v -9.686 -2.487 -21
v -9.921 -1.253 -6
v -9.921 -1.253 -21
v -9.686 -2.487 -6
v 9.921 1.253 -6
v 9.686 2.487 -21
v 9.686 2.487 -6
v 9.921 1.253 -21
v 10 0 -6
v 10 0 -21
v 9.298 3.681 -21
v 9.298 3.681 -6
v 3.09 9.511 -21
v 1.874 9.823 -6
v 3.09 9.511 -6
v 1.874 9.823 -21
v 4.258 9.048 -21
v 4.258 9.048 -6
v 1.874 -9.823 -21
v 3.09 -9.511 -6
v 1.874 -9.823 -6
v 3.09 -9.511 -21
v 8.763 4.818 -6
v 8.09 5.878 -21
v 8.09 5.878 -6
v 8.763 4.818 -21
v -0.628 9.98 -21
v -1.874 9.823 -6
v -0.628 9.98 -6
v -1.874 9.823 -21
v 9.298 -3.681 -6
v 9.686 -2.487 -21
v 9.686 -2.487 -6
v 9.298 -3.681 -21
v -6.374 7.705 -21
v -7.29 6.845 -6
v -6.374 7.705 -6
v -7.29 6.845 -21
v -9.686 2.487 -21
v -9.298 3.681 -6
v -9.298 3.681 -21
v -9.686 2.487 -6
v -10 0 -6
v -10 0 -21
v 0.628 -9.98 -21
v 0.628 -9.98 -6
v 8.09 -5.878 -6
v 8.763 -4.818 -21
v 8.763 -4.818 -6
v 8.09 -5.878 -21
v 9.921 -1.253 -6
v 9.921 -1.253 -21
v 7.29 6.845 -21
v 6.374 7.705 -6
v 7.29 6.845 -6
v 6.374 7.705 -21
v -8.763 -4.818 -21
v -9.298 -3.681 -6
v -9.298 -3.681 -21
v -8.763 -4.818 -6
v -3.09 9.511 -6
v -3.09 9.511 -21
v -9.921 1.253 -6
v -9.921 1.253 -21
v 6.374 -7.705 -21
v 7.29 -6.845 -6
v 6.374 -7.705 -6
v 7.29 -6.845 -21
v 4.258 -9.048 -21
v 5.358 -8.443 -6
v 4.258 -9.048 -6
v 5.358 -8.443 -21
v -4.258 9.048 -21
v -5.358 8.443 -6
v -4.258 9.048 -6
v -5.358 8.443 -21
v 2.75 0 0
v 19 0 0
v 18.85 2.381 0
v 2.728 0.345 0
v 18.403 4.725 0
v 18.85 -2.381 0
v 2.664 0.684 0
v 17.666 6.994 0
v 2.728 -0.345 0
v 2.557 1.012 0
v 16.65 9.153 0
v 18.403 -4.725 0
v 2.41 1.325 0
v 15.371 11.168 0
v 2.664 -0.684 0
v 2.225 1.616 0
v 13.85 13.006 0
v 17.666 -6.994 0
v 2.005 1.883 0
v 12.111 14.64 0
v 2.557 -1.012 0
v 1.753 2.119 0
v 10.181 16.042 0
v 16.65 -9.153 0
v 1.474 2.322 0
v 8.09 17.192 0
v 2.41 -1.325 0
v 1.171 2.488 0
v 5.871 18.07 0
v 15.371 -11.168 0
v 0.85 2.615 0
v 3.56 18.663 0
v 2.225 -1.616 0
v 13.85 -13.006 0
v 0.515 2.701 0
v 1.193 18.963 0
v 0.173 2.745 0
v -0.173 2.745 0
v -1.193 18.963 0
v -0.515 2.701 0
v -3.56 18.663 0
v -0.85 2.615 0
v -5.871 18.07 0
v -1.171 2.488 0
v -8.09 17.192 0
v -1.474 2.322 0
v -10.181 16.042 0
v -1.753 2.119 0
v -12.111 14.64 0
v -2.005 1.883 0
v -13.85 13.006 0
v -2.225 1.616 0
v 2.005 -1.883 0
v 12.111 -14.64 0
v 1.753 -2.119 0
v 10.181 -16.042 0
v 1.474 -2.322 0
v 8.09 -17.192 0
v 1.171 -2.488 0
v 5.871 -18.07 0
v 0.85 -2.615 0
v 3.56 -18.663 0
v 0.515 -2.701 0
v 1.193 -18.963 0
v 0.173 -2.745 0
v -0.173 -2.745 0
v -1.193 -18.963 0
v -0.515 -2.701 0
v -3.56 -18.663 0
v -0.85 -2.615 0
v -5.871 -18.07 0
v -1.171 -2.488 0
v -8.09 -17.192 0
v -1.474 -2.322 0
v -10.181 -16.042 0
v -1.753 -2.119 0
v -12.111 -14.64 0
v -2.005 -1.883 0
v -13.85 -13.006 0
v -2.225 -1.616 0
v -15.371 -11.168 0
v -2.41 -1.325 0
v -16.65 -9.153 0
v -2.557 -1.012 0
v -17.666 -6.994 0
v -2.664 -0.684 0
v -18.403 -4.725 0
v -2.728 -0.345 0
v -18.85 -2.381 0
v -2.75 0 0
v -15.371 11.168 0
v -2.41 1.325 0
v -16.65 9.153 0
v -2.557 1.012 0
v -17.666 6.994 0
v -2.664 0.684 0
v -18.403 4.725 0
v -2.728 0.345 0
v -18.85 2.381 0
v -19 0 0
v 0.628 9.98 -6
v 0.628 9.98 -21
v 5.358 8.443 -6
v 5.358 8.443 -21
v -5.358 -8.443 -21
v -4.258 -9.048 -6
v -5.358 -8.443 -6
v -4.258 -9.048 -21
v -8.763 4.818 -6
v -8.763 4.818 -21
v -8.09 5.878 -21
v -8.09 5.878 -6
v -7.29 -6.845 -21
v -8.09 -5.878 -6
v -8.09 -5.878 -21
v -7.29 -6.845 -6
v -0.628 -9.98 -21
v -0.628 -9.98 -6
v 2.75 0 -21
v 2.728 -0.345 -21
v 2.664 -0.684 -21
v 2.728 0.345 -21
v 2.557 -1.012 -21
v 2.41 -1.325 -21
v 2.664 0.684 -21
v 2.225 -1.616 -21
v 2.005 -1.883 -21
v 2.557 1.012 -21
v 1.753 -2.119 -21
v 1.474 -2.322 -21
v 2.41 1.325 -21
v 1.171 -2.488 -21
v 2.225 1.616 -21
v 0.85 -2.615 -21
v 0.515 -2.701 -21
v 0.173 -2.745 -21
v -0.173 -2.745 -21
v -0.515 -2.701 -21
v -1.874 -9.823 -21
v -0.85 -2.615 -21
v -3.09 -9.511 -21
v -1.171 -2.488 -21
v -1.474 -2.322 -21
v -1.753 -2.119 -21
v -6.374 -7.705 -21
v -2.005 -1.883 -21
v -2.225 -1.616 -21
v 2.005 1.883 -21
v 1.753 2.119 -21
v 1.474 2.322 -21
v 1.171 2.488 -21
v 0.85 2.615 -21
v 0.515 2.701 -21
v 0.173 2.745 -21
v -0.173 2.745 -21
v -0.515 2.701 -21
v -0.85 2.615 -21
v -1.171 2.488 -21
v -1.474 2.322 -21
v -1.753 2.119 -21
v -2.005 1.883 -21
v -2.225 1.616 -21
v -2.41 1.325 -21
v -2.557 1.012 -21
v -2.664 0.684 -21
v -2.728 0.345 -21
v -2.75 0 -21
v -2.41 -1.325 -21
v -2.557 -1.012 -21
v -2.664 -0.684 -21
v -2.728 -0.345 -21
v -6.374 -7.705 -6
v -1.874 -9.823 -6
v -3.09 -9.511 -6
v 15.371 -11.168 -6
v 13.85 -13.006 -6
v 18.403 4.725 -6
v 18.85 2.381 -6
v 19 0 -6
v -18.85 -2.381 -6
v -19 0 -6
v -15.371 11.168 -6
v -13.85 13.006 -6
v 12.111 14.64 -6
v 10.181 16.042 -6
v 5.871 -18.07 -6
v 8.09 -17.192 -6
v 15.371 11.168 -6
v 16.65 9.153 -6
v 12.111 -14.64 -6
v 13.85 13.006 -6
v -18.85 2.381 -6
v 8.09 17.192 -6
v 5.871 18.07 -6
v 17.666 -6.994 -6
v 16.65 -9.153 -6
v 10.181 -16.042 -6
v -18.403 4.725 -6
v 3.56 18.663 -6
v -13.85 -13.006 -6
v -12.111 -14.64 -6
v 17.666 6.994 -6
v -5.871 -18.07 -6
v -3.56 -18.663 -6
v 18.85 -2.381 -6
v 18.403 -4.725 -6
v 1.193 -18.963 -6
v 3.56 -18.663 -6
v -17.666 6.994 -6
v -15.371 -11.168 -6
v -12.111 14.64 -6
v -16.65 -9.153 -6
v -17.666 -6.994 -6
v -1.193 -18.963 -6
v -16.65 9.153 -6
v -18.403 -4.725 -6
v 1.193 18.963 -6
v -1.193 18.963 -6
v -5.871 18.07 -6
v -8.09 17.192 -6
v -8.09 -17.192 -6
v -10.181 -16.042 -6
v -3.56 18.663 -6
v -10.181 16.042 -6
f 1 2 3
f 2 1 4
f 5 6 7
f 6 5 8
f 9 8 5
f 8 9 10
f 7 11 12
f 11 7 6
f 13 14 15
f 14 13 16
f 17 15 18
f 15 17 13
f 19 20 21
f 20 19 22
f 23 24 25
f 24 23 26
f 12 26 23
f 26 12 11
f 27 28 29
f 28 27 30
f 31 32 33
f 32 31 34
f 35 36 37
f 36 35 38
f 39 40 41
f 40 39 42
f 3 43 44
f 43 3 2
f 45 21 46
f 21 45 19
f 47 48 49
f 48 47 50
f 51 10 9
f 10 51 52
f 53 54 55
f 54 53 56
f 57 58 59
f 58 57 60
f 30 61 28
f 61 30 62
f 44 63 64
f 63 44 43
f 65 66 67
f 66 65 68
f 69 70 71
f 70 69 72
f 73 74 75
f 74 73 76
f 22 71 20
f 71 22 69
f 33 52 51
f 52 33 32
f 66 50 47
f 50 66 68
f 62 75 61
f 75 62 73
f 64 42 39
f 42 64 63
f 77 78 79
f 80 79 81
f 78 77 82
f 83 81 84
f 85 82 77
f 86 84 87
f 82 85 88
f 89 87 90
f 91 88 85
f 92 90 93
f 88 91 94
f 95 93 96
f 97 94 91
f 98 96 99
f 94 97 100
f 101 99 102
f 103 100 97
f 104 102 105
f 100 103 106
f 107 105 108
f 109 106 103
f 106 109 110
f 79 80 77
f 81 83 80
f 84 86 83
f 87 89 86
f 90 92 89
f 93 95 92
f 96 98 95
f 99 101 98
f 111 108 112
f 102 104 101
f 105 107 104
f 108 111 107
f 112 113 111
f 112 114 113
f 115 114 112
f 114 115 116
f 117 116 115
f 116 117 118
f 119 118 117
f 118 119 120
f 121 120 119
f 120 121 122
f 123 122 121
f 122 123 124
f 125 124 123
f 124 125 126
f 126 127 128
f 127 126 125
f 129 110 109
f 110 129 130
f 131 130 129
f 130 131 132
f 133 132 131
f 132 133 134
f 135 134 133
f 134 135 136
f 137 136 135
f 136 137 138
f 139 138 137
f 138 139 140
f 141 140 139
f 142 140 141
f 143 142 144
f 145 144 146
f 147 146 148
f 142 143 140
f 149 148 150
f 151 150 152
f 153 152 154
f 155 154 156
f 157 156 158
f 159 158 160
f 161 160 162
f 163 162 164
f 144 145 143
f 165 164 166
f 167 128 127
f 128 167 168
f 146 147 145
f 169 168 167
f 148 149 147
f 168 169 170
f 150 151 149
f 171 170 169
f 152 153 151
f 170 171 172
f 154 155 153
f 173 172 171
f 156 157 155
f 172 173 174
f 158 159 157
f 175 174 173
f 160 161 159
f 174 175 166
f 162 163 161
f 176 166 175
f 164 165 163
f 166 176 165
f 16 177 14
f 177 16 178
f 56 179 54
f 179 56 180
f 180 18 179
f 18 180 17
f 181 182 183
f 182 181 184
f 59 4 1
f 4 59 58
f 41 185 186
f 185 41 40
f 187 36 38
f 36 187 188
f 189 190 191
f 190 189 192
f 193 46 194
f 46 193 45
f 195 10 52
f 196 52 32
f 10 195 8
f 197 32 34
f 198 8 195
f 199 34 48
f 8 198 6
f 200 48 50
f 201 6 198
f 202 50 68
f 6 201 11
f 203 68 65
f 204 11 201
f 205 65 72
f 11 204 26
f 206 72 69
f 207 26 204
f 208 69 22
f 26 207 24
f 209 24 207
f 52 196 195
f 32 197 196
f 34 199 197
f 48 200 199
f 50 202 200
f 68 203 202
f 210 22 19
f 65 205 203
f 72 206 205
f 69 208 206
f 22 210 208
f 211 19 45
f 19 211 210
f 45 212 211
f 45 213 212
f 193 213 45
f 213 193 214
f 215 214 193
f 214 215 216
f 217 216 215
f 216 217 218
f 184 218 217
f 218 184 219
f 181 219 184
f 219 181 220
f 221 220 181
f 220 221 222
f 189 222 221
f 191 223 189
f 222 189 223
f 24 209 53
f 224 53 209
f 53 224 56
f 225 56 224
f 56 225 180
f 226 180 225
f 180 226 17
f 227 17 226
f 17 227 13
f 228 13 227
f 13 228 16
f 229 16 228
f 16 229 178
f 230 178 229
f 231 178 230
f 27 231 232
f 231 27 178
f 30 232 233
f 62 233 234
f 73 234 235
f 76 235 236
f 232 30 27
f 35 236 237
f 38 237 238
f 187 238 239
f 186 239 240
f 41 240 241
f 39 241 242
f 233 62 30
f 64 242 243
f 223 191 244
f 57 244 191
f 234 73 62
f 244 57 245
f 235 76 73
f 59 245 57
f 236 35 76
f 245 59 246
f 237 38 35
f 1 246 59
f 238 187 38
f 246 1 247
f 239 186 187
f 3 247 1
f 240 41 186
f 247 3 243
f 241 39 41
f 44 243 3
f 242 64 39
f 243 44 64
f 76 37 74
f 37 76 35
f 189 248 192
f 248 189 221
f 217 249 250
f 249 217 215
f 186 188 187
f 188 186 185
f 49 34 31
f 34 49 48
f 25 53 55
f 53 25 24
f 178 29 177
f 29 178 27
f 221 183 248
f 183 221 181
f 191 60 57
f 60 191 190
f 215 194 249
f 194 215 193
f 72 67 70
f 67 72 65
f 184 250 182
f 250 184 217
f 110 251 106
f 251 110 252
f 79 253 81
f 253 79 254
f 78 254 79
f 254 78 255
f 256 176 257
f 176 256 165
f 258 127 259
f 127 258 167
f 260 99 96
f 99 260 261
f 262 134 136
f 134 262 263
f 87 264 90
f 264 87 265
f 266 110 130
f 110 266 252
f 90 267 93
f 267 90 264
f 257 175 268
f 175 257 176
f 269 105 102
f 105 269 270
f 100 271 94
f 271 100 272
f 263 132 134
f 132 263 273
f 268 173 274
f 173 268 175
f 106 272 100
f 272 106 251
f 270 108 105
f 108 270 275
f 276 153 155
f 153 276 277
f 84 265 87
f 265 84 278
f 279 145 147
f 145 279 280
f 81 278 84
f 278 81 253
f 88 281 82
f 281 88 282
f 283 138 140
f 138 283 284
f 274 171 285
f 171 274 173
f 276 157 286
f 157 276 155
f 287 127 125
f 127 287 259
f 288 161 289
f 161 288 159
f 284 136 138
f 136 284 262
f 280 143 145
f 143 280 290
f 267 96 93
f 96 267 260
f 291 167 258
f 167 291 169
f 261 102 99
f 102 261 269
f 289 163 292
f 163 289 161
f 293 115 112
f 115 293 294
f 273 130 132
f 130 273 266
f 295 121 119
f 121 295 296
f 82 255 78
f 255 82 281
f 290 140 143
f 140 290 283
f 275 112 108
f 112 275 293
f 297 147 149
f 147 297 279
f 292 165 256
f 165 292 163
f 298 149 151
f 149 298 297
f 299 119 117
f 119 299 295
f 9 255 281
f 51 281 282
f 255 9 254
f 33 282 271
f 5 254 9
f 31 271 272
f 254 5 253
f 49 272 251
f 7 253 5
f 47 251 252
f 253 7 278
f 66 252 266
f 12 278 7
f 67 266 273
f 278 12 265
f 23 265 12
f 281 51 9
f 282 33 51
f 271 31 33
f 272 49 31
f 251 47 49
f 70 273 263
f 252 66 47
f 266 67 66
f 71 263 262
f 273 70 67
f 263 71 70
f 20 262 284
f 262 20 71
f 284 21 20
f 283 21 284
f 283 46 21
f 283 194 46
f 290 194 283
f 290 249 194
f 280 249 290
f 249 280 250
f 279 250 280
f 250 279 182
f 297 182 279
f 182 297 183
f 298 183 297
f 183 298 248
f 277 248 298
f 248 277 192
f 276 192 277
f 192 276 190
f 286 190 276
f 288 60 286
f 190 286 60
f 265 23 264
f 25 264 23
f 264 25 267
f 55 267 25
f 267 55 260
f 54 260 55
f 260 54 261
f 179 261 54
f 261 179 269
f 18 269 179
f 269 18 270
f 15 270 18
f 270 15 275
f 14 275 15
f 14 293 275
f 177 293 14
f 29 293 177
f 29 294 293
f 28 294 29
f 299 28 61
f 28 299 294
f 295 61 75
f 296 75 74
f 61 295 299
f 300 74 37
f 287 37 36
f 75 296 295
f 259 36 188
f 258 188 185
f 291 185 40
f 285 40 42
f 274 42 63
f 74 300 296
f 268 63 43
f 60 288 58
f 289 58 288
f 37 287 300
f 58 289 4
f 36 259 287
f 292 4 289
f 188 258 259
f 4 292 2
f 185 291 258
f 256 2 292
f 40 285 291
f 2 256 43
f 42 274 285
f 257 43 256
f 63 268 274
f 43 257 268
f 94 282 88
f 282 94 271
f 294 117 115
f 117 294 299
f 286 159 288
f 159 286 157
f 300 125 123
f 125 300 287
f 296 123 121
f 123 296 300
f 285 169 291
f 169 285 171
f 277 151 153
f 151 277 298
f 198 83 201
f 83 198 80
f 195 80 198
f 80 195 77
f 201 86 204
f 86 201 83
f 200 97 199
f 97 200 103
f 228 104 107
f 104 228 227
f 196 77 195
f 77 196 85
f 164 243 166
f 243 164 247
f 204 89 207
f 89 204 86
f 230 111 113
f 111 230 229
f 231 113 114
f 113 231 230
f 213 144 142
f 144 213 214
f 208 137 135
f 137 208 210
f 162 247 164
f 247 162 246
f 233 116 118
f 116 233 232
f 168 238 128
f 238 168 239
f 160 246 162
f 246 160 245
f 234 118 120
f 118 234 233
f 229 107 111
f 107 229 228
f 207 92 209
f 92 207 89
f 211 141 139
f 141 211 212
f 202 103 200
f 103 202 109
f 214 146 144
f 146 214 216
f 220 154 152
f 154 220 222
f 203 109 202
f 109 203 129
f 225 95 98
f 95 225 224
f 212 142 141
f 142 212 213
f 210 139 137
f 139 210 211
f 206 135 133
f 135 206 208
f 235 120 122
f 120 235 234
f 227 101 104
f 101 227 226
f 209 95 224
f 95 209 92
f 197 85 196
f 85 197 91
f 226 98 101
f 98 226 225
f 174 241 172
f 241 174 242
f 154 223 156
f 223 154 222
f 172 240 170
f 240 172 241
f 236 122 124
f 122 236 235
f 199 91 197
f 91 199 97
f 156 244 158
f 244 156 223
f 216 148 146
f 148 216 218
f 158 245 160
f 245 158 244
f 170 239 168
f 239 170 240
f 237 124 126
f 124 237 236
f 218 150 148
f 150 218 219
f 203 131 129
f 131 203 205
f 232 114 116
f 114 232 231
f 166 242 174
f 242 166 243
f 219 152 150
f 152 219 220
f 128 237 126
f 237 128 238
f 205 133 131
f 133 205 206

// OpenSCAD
$fn = 50;


difference() {
	union() {
		translate(v = [0, 0, -21.0000000000]) {
			cylinder(h = 21, r = 10.0000000000);
		}
		translate(v = [0, 0, -6.0000000000]) {
			cylinder(h = 6, r = 19.0000000000);
		}
	}
	union() {
		#translate(v = [0, 0, -21]) {
			cylinder(h = 21, r = 2.7500000000);
		}
	}
}
